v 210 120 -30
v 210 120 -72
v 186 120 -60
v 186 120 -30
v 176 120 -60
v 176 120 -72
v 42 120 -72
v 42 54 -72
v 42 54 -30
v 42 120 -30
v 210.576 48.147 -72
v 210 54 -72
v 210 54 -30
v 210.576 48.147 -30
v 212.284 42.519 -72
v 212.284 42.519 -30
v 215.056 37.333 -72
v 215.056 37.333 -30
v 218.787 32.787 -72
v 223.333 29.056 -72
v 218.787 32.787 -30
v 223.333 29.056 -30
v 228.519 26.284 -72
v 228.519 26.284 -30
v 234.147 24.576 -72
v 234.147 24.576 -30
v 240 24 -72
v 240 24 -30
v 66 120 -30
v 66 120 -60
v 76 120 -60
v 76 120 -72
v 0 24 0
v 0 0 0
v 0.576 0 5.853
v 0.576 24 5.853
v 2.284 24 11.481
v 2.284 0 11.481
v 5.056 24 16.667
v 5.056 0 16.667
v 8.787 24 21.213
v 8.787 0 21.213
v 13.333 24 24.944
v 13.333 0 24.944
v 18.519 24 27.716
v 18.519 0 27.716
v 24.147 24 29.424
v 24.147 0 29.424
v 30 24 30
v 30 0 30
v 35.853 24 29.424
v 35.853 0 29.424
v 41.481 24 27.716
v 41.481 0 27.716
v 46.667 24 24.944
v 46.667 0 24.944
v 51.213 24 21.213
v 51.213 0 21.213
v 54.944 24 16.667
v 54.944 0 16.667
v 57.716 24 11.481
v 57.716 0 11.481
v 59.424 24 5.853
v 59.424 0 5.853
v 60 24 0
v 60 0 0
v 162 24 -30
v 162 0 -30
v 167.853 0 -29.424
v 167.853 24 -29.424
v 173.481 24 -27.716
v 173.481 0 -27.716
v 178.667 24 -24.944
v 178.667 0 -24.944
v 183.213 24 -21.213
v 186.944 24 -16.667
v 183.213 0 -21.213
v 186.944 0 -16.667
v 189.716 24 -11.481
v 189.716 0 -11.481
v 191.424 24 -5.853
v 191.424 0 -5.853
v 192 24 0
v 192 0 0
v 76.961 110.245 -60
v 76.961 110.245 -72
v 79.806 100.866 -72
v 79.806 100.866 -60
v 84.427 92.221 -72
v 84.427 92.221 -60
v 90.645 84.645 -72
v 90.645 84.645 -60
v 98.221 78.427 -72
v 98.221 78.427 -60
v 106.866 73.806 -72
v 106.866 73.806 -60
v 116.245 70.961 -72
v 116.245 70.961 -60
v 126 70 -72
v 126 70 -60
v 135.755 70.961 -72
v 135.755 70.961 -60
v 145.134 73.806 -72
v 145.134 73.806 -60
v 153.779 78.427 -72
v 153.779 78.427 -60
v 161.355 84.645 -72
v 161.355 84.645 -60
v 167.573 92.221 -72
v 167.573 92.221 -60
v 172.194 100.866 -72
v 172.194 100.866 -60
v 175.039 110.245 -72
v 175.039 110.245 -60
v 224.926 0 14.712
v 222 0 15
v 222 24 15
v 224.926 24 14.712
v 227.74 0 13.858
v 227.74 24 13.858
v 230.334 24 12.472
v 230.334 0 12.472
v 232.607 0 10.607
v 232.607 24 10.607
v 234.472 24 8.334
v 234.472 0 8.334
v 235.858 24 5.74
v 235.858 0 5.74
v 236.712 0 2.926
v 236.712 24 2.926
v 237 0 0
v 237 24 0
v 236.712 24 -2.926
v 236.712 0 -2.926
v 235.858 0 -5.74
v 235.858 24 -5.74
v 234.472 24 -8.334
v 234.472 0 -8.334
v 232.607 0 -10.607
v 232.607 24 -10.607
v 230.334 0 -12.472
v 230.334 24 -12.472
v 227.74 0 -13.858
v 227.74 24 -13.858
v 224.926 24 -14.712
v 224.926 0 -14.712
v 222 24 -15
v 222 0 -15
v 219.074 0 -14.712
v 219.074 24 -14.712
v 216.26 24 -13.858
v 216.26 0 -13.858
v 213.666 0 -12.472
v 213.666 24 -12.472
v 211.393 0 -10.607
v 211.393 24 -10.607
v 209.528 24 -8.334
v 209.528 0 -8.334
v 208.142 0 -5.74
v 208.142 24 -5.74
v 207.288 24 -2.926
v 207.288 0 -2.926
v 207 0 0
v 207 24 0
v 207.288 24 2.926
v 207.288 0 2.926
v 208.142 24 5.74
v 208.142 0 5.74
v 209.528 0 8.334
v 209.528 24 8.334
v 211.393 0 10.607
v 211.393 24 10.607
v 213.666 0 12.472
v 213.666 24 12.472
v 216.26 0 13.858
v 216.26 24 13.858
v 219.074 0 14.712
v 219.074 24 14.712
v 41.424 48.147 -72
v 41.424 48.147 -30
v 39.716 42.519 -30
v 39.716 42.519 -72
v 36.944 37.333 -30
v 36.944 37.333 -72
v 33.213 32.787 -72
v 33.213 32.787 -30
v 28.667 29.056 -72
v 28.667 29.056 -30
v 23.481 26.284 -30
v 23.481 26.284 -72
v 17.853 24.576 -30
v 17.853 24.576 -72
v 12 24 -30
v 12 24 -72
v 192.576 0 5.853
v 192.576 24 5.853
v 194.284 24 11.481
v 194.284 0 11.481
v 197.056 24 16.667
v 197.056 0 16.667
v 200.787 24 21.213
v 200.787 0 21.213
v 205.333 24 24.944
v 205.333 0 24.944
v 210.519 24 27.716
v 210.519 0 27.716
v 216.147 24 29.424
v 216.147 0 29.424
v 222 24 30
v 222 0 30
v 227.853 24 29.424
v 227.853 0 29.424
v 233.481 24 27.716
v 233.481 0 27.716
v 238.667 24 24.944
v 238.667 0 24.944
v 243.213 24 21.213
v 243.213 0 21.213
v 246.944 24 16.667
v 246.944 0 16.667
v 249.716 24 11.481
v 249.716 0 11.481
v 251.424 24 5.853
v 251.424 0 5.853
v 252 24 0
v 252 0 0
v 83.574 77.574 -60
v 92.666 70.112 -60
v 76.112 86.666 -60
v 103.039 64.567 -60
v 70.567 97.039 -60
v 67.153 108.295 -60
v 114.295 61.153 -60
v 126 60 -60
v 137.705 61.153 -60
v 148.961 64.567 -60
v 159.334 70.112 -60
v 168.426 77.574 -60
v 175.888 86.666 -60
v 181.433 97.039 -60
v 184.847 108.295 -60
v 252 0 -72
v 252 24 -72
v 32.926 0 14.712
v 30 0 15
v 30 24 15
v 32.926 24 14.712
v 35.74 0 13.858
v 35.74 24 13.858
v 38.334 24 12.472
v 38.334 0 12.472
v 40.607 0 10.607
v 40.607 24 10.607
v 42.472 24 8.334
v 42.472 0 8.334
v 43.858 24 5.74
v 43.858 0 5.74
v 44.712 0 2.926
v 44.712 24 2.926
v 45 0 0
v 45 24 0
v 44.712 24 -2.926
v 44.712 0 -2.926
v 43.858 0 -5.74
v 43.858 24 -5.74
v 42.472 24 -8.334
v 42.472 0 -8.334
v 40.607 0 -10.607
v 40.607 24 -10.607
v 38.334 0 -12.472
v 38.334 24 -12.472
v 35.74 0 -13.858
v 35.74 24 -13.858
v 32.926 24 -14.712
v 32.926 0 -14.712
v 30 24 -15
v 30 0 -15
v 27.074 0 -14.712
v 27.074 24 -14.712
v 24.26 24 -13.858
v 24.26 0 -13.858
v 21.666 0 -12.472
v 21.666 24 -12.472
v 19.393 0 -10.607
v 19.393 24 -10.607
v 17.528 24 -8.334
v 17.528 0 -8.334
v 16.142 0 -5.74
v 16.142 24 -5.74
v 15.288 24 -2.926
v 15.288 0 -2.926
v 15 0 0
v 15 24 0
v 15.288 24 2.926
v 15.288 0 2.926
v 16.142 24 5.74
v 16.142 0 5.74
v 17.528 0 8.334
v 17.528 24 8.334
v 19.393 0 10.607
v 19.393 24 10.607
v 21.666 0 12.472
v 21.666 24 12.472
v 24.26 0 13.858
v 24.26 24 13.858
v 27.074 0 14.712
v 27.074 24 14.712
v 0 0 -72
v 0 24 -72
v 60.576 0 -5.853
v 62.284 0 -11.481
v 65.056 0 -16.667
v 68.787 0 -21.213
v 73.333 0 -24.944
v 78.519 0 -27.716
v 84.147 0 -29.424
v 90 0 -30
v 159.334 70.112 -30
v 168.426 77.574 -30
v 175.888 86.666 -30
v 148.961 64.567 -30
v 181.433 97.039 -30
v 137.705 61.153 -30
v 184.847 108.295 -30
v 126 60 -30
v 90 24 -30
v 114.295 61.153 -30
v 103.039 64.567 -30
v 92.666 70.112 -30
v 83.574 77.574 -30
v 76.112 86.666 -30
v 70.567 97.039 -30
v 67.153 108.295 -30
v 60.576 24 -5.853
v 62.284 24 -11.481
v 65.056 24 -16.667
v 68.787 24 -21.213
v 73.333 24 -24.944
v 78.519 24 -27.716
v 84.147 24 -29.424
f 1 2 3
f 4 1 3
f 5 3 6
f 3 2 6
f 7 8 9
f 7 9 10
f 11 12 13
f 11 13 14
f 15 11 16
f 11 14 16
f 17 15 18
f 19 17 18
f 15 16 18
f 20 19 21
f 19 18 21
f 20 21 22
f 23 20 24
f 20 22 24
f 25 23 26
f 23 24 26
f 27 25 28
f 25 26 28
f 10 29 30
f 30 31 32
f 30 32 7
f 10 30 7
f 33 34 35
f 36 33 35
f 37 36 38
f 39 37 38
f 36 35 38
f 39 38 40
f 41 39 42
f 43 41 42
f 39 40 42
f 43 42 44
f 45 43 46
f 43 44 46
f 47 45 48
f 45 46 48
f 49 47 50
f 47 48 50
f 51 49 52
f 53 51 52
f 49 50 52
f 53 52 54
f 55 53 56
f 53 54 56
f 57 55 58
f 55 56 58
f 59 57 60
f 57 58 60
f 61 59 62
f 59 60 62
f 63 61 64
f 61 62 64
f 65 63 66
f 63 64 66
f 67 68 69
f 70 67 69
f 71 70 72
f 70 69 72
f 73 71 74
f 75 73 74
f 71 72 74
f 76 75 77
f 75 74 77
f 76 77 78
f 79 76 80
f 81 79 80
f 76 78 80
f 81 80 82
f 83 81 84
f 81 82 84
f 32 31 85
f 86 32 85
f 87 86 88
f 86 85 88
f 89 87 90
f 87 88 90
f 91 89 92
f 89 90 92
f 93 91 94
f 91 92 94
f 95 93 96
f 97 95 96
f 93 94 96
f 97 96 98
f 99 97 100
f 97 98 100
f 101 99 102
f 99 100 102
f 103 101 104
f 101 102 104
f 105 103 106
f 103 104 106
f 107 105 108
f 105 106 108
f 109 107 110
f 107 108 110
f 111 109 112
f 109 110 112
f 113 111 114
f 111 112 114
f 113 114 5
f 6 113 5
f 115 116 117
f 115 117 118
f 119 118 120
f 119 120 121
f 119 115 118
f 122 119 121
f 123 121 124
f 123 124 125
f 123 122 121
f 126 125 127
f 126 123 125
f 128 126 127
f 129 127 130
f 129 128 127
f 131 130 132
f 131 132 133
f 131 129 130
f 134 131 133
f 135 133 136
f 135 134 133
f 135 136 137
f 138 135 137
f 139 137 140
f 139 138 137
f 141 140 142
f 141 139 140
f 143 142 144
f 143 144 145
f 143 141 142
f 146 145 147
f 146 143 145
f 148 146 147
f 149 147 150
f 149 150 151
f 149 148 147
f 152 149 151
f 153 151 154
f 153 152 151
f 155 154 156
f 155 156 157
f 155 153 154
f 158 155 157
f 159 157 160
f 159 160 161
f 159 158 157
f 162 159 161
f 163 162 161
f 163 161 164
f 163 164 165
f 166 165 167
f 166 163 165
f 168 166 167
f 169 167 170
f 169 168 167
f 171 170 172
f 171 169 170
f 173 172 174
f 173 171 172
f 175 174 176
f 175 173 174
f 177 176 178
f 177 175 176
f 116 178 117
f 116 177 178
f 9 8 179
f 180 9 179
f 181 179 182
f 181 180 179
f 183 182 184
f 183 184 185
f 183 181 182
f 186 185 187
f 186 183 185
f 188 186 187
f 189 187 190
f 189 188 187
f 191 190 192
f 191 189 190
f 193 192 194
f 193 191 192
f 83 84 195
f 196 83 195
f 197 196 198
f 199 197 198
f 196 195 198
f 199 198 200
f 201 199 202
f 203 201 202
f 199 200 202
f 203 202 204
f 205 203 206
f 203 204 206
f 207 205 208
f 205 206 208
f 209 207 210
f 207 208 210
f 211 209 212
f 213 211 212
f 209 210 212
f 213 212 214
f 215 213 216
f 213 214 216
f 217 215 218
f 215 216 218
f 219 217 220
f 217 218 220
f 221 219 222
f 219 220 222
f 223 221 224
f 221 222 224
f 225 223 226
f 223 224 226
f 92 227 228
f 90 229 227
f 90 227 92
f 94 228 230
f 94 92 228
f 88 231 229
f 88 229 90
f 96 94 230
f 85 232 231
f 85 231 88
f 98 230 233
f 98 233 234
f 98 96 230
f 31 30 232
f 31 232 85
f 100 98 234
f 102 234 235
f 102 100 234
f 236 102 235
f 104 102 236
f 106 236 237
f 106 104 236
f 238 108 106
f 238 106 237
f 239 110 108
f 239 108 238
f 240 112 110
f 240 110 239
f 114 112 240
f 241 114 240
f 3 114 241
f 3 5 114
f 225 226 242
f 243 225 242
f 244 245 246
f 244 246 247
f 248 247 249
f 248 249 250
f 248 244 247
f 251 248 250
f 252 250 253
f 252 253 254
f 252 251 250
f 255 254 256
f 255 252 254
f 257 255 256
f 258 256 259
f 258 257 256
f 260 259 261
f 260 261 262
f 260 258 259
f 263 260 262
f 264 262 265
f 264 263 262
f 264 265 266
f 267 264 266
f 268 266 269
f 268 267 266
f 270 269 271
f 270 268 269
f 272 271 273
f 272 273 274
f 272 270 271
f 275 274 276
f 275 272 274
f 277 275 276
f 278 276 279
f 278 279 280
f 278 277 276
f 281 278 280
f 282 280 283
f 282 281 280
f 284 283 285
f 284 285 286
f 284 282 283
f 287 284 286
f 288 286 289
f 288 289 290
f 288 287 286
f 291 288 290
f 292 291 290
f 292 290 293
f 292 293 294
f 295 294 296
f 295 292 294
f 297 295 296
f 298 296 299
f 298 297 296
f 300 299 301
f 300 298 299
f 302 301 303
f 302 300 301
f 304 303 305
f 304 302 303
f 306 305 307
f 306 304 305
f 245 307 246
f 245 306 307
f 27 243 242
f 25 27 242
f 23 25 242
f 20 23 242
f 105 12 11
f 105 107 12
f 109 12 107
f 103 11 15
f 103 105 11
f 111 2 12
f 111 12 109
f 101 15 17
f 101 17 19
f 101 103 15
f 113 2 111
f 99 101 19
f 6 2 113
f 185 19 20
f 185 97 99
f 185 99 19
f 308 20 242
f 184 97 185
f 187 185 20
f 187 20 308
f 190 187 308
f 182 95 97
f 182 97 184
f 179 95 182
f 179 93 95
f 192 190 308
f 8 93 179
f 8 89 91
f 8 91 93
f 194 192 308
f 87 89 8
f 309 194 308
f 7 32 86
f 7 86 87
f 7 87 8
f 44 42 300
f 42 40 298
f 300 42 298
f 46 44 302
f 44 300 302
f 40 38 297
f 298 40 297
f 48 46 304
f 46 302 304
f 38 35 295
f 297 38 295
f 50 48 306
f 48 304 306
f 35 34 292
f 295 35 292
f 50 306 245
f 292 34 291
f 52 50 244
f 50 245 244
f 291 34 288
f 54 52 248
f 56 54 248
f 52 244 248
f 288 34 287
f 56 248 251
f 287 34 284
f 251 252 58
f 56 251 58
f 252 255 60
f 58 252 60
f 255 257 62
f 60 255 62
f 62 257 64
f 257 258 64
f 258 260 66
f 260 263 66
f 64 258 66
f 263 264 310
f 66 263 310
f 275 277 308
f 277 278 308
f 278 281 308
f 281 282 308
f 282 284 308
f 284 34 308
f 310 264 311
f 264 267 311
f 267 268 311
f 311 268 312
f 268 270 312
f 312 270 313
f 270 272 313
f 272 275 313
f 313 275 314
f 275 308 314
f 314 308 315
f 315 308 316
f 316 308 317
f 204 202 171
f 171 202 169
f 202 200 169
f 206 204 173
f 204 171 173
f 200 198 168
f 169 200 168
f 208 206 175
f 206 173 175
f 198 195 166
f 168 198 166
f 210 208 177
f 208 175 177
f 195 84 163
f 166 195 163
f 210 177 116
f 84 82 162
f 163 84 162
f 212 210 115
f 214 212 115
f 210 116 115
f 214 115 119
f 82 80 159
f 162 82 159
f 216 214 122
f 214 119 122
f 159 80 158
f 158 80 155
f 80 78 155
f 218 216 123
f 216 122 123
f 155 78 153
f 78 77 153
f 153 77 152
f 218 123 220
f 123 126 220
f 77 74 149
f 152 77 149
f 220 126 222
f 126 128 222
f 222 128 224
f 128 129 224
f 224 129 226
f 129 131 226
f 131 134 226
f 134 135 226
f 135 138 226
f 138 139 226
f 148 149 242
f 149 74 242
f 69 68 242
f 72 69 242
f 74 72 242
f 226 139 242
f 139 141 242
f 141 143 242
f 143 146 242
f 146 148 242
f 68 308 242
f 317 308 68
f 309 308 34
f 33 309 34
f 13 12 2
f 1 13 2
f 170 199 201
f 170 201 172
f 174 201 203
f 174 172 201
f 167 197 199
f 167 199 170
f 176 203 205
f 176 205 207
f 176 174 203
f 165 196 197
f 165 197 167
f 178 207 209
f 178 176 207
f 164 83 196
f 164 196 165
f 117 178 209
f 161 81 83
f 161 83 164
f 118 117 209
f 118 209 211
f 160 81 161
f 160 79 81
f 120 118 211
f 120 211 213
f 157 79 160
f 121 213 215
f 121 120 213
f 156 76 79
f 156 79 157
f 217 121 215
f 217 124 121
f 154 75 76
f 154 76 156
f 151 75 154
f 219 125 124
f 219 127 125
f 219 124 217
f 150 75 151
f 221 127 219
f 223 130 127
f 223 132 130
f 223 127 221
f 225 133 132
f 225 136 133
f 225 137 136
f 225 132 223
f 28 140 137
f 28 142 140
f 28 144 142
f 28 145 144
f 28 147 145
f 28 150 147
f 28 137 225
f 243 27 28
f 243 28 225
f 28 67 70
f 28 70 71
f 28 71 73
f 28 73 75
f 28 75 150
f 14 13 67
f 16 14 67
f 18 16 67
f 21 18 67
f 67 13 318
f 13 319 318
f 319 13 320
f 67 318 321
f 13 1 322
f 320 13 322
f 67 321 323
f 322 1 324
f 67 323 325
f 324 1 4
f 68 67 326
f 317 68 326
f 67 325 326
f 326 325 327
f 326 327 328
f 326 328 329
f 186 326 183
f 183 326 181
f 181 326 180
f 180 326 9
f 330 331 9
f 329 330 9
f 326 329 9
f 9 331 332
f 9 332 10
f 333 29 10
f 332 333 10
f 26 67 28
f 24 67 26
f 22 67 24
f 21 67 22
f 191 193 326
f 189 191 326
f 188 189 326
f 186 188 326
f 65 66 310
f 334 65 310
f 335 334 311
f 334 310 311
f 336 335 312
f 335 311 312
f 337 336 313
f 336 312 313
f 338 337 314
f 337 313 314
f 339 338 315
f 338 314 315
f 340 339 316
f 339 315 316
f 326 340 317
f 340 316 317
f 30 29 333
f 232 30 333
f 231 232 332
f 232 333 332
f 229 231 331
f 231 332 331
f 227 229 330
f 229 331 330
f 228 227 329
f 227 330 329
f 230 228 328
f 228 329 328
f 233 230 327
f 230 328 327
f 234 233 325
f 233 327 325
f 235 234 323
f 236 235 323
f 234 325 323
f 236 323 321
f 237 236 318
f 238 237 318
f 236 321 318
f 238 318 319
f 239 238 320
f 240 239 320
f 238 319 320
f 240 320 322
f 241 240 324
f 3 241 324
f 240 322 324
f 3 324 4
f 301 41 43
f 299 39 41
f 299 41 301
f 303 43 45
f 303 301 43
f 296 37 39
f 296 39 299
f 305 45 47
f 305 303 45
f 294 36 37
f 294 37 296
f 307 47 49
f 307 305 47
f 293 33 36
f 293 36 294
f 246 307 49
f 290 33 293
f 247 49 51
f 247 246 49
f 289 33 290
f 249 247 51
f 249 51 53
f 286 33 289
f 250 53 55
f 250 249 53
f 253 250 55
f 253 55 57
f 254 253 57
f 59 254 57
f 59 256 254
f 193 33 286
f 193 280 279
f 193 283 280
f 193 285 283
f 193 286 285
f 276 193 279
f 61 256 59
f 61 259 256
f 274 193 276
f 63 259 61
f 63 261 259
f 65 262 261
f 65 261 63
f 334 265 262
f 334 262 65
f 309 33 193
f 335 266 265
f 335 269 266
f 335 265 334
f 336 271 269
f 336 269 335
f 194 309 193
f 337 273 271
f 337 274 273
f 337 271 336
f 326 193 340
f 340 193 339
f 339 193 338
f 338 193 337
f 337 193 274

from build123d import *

# Parameters (mm, degrees)
SKETCH_1_R          = 15
EXTRUDE_1_DEPTH     = 24
SKETCH_3_W          = 168
SKETCH_3_H          = 96
EXTRUDE_2_DEPTH     = 42
SKETCH_4_R          = 60
CUT_EXTRUDE_1_DEPTH = 30
SKETCH_5_R          = 50
CUT_EXTRUDE_2_DEPTH = 30
FILLET_1_R          = 30


with BuildPart() as part:
    # 草圖1 → 填料-伸長1 (new body)
    # profile 1 of 2: a face of its own
    with BuildSketch(Plane(origin=(0, 0, 0), x_dir=(1, 0, 0), z_dir=(0, 1, 0))):
        with BuildLine():
            Line((252, 72), (126, 72))
            Line((126, 72), (126, 30))
            Line((126, 30), (162, 30))
            ThreePointArc((162, 30), (183.213203436, 21.213203436), (192, 0))
            ThreePointArc((192, 0), (222, -30), (252, 0))
            Line((252, 0), (252, 72))
        make_face()
        with Locations(Location((222, 0, 0), (0, 0, 270))):
            Circle(SKETCH_1_R, mode=Mode.SUBTRACT)
    # profile 2 of 2: a face of its own
    with BuildSketch(Plane(origin=(0, 0, 0), x_dir=(1, 0, 0), z_dir=(0, 1, 0))):
        with BuildLine():
            Line((0, 72), (0, 0))
            ThreePointArc((0, 0), (30, -30), (60, 0))
            ThreePointArc((60, 0), (68.786796564, 21.213203436), (90, 30))
            Line((90, 30), (126, 30))
            Line((126, 30), (126, 72))
            Line((126, 72), (0, 72))
        make_face()
        with Locations(Location((30, 0, 0), (0, 0, 270))):
            Circle(SKETCH_1_R, mode=Mode.SUBTRACT)
    extrude(amount=EXTRUDE_1_DEPTH)

    # 草圖3 → 填料-伸長2 (add)
    with BuildSketch(Plane(origin=(0, 0, -72), x_dir=(-1, 0, 0), z_dir=(0, 0, -1))):
        with Locations((-126, 72)):
            Rectangle(SKETCH_3_W, SKETCH_3_H)
    extrude(amount=-EXTRUDE_2_DEPTH)

    # 草圖4 → 除料-伸長1 (cut)
    with BuildSketch(Plane.XY.offset(-30)):
        with Locations((126, 120)):
            Circle(SKETCH_4_R)
    extrude(amount=-CUT_EXTRUDE_1_DEPTH, mode=Mode.SUBTRACT)

    # 草圖5 → 除料-伸長2 (cut)
    with BuildSketch(Plane.XY.offset(-60)):
        with Locations((126, 120)):
            Circle(SKETCH_5_R)
    extrude(amount=-CUT_EXTRUDE_2_DEPTH, mode=Mode.SUBTRACT)

    # 圓角1
    fillet_1_edges = [part.edges().sort_by_distance(p)[0] for p in [
        (42, 24, -51),
        (210, 24, -51),
    ]]
    fillet(fillet_1_edges, radius=FILLET_1_R)


solid = part.part
